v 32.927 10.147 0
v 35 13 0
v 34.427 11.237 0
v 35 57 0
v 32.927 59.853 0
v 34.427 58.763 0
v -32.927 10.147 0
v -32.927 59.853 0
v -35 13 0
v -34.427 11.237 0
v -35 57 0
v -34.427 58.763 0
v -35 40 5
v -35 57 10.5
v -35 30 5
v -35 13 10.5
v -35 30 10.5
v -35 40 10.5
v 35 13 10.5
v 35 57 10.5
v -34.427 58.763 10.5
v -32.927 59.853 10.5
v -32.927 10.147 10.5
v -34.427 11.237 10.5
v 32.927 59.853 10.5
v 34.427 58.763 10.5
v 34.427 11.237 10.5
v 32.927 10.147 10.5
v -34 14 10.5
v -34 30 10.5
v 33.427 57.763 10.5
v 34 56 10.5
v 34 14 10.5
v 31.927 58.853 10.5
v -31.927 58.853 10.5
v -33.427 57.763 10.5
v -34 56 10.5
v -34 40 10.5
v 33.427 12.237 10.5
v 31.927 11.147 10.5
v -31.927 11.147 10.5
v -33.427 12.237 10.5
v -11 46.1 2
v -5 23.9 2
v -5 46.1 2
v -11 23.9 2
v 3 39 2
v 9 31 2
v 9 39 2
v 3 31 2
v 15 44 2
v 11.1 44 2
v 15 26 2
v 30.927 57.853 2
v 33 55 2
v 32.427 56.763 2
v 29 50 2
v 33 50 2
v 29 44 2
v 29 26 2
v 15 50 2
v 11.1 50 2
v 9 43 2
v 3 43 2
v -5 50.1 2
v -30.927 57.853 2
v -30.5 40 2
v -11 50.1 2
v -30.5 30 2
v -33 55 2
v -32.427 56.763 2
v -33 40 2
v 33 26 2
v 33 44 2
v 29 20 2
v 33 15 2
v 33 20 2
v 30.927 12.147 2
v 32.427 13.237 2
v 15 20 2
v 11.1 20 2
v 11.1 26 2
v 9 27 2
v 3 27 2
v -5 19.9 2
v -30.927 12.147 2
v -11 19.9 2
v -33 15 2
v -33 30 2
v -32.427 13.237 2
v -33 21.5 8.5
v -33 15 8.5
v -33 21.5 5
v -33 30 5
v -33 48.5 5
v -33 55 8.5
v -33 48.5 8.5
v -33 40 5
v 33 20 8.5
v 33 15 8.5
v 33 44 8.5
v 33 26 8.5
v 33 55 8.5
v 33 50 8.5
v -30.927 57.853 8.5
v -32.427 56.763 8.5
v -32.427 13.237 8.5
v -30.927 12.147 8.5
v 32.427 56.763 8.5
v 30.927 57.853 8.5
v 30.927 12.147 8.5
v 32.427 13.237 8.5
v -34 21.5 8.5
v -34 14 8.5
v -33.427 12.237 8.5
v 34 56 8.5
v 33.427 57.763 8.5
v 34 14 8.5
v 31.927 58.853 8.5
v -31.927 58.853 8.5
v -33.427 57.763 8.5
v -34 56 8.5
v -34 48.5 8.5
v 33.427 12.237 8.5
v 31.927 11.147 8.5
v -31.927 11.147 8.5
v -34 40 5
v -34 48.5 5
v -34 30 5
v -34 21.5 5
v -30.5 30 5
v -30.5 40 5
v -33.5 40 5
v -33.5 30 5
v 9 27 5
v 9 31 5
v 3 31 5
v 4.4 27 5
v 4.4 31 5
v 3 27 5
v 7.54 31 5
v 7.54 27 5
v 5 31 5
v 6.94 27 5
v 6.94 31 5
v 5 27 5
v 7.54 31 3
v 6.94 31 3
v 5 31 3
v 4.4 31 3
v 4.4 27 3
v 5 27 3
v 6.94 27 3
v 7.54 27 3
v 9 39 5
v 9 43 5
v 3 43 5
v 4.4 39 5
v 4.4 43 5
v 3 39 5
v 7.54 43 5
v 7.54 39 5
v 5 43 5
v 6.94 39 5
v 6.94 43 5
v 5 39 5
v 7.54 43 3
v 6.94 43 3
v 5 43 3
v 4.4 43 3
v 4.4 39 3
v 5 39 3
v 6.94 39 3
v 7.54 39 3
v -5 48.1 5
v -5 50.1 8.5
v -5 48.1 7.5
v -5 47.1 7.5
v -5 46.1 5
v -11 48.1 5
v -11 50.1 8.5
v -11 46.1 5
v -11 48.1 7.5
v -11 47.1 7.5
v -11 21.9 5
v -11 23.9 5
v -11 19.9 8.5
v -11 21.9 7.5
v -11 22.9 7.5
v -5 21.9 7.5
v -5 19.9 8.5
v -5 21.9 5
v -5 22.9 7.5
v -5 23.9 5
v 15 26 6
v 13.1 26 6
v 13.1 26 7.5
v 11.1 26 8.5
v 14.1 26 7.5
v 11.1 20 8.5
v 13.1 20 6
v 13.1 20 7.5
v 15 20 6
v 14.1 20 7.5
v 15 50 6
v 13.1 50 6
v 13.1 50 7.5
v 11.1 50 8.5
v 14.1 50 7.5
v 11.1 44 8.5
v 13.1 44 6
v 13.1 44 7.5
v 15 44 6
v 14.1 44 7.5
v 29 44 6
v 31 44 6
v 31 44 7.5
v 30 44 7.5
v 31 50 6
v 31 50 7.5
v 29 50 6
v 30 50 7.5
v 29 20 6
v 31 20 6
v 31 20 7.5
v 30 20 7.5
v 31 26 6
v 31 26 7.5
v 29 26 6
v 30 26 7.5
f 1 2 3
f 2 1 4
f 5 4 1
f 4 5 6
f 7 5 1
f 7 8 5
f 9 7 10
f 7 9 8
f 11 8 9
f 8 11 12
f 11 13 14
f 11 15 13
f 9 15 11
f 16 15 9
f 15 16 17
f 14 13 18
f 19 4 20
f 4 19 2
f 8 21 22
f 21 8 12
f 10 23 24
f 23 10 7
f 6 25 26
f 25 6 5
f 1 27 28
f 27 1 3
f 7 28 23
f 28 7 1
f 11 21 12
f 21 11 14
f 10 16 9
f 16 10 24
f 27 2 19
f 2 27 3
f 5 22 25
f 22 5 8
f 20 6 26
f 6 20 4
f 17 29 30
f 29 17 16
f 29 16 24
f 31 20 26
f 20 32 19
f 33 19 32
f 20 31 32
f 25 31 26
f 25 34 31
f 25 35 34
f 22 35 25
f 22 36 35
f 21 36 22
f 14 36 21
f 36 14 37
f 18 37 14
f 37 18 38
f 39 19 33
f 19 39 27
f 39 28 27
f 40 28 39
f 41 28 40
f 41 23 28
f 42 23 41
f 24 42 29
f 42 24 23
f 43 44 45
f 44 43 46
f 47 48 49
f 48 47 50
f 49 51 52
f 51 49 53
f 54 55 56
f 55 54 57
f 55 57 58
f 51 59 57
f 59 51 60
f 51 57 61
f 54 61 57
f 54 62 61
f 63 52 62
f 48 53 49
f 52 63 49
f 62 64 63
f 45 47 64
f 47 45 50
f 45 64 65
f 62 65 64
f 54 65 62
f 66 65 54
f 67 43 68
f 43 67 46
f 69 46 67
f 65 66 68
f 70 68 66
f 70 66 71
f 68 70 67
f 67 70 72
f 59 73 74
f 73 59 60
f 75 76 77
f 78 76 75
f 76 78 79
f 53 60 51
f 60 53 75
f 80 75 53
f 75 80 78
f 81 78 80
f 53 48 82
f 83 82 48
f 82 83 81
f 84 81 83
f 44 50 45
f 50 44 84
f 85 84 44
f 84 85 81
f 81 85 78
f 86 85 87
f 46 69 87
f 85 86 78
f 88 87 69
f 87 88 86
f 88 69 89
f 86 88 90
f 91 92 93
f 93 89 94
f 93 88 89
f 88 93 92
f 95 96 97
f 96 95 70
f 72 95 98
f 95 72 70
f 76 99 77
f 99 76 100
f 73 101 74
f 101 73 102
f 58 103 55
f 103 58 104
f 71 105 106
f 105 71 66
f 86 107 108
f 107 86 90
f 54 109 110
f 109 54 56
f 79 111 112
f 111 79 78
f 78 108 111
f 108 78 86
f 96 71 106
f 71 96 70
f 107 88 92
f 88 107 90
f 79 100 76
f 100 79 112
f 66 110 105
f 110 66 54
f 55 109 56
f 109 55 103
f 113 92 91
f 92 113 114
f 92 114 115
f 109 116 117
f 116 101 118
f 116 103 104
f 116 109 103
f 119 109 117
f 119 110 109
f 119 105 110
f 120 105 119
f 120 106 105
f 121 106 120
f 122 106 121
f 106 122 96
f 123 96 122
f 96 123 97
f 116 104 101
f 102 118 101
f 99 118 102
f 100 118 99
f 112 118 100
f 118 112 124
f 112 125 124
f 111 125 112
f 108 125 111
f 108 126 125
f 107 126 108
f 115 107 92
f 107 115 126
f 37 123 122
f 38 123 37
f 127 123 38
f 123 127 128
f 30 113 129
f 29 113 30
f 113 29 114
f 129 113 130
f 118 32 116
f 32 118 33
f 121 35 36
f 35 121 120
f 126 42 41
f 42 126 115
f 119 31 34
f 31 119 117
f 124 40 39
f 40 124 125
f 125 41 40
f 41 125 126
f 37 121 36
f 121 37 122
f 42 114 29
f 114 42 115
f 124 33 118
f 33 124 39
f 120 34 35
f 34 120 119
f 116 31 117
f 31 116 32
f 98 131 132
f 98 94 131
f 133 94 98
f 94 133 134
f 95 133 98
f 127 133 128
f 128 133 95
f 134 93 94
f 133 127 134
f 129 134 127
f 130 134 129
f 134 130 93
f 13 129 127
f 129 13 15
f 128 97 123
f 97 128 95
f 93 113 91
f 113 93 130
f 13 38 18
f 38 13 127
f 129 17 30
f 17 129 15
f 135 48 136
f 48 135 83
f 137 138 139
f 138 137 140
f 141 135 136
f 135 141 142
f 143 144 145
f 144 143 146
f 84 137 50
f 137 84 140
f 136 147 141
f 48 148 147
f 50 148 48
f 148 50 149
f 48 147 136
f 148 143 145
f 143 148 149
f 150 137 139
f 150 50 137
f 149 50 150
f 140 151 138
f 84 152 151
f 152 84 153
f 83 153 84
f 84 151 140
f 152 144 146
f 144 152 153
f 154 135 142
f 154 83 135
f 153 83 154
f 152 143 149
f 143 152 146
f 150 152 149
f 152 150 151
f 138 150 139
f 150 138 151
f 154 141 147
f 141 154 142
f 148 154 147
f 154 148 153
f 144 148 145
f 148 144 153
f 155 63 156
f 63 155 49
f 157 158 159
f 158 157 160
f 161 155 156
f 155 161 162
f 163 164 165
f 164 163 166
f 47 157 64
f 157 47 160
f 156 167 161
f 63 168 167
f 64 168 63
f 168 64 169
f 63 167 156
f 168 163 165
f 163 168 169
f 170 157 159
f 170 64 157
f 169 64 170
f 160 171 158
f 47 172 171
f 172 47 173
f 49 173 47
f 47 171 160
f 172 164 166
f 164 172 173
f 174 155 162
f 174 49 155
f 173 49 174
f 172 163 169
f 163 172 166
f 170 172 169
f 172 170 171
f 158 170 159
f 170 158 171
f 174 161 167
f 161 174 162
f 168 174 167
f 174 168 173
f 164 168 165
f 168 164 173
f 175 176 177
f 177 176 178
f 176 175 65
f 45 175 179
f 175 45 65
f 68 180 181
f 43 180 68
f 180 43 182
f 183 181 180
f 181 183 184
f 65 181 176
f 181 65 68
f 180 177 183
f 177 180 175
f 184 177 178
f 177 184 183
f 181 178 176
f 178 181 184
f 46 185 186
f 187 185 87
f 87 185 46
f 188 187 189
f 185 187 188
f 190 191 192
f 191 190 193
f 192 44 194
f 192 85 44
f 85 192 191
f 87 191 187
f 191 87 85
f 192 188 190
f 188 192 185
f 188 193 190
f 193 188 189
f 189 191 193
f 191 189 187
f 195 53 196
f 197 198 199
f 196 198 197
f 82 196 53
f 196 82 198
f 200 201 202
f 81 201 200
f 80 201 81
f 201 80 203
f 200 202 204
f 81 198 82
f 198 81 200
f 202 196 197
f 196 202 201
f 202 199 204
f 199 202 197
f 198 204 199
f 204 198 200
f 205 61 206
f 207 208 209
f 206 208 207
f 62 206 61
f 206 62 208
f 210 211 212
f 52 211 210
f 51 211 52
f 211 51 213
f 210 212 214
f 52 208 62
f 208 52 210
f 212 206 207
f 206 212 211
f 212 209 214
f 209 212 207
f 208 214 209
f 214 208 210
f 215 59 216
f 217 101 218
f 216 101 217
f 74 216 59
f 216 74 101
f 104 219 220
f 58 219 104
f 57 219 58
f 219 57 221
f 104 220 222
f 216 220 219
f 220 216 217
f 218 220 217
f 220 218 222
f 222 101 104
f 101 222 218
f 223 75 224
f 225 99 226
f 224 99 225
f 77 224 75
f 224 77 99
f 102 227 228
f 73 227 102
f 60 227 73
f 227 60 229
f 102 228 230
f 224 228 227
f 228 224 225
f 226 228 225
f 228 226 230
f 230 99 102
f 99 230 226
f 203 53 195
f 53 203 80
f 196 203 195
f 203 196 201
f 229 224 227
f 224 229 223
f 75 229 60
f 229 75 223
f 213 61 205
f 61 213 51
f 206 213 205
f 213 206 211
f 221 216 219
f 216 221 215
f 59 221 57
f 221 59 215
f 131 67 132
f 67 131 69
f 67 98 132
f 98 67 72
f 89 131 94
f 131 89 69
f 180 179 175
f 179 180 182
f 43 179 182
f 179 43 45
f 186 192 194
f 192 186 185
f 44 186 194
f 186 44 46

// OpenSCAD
// 0 = both, 1 = base, 2 = lid
mode = 1;

d1_length = 34.2;
d1_width = 25.6;

box_length = 70;
box_width = 50;
box_height = 10.5;

rcwl_length = 35.9;
rcwl_width = 17.3;

thickness = 2;
padding = 1.075 + (0.75/2);

xOffset = box_width/2 + 10;

if (mode == 0) {
    xOffset = box_width/2 + 10;
    box();
    templates();
    lid();
}
if (mode == 1) {
    xOffset = 0;
    box();
}

if (mode == 2) {
    xOffset = 0;
    lid();
}

module roundedBox(shrink, offset, height) {
    radius = 3;
    
    hull() {
        translate([-box_length/2+radius+shrink, -box_width/2+radius+shrink+offset, 0]) {
            cylinder(r1= 3, r2=3, h=height);
        }
        
        translate([-box_length/2+radius+shrink, box_width/2-radius-shrink+offset, 0]) {
            cylinder(r1= 3, r2=3, h=height);
        }
        
        translate([box_length/2-radius-shrink, -box_width/2+radius+shrink+offset, 0]) {
            cylinder(r1= 3, r2=3, h=height);
        }
        
        translate([box_length/2-radius-shrink, box_width/2-radius-shrink+offset, 0]) {
            cylinder(r1= 3, r2=3, h=height);
        }
    }
}

module box() {
    radius = 3;
    z = 2;
    z2 = box_height;
    
    difference() {
        
        roundedBox(0, xOffset, box_height);
        
        // Hollow out
        translate([0,0,2]) {
            roundedBox(2, xOffset, box_height);
        }
        
        // lip
        difference() {
            translate([0,0,8.5]) {
                roundedBox(1, xOffset, box_height);
            }
        }
       
       // usb lip 
        translate([-33, 35, 20])
                cube([2, 27,30], center=true);

//         // Usb Hole
        translate([-box_length/2-3, -5+xOffset, 5])
            cube([10, 10, 7]);   
     }
     
    frontRiser();
    leftRiser();
    rightRiser();
     ledHolder();
     clips();
}

module clips() {
    clip(-8, 12.1);
    rotate([0,0,180])
        clip(8, -22.9-xOffset);

    rotate([0,0,90])
        clip(23, -14.1-xOffset);
    rotate([0,0,90])
        clip(47, -14.1-xOffset);

    rotate([0,0,-90])
        clip(-47, 30-xOffset);
    rotate([0,0,-90])
        clip(-23, 30-xOffset);

    translate([13,xOffset-15,0]) {
        cube([2,6,6]);
    }

    translate([29,xOffset-15,0]) {
        cube([2,6,6]);
    }

    translate([13,xOffset+9,0]) {
        cube([2,6,6]);
    }

    translate([29,xOffset+9,0]) {
        cube([2,6,6]);
    }
}

module lid() {

    difference() {
        
        roundedBox(0, -xOffset, , 4);
        
        translate([0,0,2]) {
            roundedBox(2, -xOffset, 4);
        }
        
        translate([0,0,7]) {
            roundedBox(1, xOffset);
        }

         // LED Hole
       translate([6,0-xOffset, -1])
            cylinder(r1=1, r2=2.5, h=3);  
         
         
          // Usb Hole
       translate([-box_length/2-5, -5-xOffset, 3])
            cube([10, 10, 10]);   
         }
         
         difference() {
        
        roundedBox(1, -xOffset, , 6);
        
        translate([0,0,2]) {
            roundedBox(2, -xOffset, 6);
        }
        
        translate([0,0,7]) {
            roundedBox(1, xOffset);
        }
        
        // LED Hole
       translate([6,0-xOffset, -1])
            cylinder(r1=1, r2=2.5, h=3);  
         
         
          // Usb Hole
       translate([-box_length/2-5, -13.5-xOffset, 3])
            cube([10, 27, 10]);   
       }
}


module templates() {
    d1();
    rcwl();
    led();
}


module d1() {
    translate([-18,0+xOffset,6])
    cube([d1_length, d1_width, 2], center=true);
}

module frontRiser() {
    translate([-(box_length/2)+3,0+xOffset,3])
    cube([3,10,4], center=true);
}


module leftRiser() {
    translate([-8,12.1+xOffset,3])
    cube([6,2,4], center=true);
}

module rightRiser() {
    translate([-8,-12.1+xOffset,3])
    cube([6,2,4], center=true);
}


module clip(x, y) {
    translate([x, y+2+xOffset, 4.75])
        cube([6, 2, 6], center=true);
    
    translate([x-3, y+xOffset, 7.5])
            prism(6,3,1);
}




module  poles(x) {
    translate([x, 0+xOffset, 5]) {
        translate([rcwl_width/2-padding, rcwl_length/2-padding,0]) {
            cylinder(h=5, r1=.5, r2=.5, center=true);
            translate([0,0,-2]) {
                cylinder(h=4, r1=1, r2=1, center=true);
            }
        }
        
        translate([-rcwl_width/2+padding, rcwl_length/2-padding,0]) {
            cylinder(h=5, r1=.5, r2=.5, center=true);
            translate([0,0,-2]) {
                cylinder(h=4, r1=1, r2=1, center=true);
            }
        }
        
        translate([rcwl_width/2-padding, -rcwl_length/2+padding,0]) {
            cylinder(h=5, r1=.5, r2=.5, center=true);
            translate([0,0,-2]) {
                cylinder(h=4, r1=1, r2=1, center=true);
            }
        }
        
        translate([-rcwl_width/2+padding, -rcwl_length/2+padding,0]) {
            cylinder(h=5, r1=.5, r2=.5, center=true);
            translate([0,0,-2]) {
                cylinder(h=4, r1=1, r2=1, center=true);
            }
        }
        
        translate([rcwl_width/2-padding, -rcwl_length/2+padding+15,0]) {
            cylinder(h=5, r1=.5, r2=.5, center=true);
            translate([0,0,-2]) {
                cylinder(h=4, r1=1, r2=1, center=true);
            }
        }
        
        translate([-rcwl_width/2+padding, -rcwl_length/2+padding+15,0]) {
            cylinder(h=5, r1=.5, r2=.5, center=true);
            translate([0,0,-2]) {
                cylinder(h=4, r1=1, r2=1, center=true);
            }
        }
    }
}

module led() {
    translate([6, xOffset, 3])
        cylinder(r1=2.5, r2=2.5, h=8.7);
}

module rcwl() {
    translate([22, 0+xOffset, 6]) {
        difference() {
            cube([rcwl_width, rcwl_length, 2], center=true);
            
            translate([rcwl_width/2-padding, rcwl_length/2-padding,-1])
                cylinder(h=10, r1=1, r2=1, center=true);
            
            translate([-rcwl_width/2+padding, rcwl_length/2-padding,-1])
                cylinder(h=10, r1=1, r2=1, center=true);
            
             translate([rcwl_width/2-padding, -rcwl_length/2+padding,-1])
                cylinder(h=10, r1=1, r2=1, center=true);
            
            translate([-rcwl_width/2+padding, -rcwl_length/2+padding,-1])
                cylinder(h=10, r1=1, r2=1, center=true);
        }
    }
}

module ledHolder() {
    translate([3, xOffset-8, 0]) {
        
        offset = 1.4;
        
       difference() {
            cube([6,4,5]);
           
           translate([offset, 0, 3])
           cube([0.6,15,2]);
           
           translate([offset+2.54, 0, 3])
           cube([0.6,15,2]);
        }
    }
    
    translate([3, xOffset+4, 0]) {
        
        offset = 1.4;
        
       difference() {
            cube([6,4,5]);
           
           translate([offset, 0, 3])
           cube([0.6,15,2]);
           
           translate([offset+2.54, 0, 3])
           cube([0.6,15,2]);
        }
    }
}

module prism(l, w, h){
       polyhedron(
               points=[[0,0,0], [l,0,0], [l,w,0], [0,w,0], [0,w,h], [l,w,h]],
               faces=[[0,1,2,3],[5,4,3,2],[0,4,5,1],[0,3,4],[5,2,1]]
        );
}
